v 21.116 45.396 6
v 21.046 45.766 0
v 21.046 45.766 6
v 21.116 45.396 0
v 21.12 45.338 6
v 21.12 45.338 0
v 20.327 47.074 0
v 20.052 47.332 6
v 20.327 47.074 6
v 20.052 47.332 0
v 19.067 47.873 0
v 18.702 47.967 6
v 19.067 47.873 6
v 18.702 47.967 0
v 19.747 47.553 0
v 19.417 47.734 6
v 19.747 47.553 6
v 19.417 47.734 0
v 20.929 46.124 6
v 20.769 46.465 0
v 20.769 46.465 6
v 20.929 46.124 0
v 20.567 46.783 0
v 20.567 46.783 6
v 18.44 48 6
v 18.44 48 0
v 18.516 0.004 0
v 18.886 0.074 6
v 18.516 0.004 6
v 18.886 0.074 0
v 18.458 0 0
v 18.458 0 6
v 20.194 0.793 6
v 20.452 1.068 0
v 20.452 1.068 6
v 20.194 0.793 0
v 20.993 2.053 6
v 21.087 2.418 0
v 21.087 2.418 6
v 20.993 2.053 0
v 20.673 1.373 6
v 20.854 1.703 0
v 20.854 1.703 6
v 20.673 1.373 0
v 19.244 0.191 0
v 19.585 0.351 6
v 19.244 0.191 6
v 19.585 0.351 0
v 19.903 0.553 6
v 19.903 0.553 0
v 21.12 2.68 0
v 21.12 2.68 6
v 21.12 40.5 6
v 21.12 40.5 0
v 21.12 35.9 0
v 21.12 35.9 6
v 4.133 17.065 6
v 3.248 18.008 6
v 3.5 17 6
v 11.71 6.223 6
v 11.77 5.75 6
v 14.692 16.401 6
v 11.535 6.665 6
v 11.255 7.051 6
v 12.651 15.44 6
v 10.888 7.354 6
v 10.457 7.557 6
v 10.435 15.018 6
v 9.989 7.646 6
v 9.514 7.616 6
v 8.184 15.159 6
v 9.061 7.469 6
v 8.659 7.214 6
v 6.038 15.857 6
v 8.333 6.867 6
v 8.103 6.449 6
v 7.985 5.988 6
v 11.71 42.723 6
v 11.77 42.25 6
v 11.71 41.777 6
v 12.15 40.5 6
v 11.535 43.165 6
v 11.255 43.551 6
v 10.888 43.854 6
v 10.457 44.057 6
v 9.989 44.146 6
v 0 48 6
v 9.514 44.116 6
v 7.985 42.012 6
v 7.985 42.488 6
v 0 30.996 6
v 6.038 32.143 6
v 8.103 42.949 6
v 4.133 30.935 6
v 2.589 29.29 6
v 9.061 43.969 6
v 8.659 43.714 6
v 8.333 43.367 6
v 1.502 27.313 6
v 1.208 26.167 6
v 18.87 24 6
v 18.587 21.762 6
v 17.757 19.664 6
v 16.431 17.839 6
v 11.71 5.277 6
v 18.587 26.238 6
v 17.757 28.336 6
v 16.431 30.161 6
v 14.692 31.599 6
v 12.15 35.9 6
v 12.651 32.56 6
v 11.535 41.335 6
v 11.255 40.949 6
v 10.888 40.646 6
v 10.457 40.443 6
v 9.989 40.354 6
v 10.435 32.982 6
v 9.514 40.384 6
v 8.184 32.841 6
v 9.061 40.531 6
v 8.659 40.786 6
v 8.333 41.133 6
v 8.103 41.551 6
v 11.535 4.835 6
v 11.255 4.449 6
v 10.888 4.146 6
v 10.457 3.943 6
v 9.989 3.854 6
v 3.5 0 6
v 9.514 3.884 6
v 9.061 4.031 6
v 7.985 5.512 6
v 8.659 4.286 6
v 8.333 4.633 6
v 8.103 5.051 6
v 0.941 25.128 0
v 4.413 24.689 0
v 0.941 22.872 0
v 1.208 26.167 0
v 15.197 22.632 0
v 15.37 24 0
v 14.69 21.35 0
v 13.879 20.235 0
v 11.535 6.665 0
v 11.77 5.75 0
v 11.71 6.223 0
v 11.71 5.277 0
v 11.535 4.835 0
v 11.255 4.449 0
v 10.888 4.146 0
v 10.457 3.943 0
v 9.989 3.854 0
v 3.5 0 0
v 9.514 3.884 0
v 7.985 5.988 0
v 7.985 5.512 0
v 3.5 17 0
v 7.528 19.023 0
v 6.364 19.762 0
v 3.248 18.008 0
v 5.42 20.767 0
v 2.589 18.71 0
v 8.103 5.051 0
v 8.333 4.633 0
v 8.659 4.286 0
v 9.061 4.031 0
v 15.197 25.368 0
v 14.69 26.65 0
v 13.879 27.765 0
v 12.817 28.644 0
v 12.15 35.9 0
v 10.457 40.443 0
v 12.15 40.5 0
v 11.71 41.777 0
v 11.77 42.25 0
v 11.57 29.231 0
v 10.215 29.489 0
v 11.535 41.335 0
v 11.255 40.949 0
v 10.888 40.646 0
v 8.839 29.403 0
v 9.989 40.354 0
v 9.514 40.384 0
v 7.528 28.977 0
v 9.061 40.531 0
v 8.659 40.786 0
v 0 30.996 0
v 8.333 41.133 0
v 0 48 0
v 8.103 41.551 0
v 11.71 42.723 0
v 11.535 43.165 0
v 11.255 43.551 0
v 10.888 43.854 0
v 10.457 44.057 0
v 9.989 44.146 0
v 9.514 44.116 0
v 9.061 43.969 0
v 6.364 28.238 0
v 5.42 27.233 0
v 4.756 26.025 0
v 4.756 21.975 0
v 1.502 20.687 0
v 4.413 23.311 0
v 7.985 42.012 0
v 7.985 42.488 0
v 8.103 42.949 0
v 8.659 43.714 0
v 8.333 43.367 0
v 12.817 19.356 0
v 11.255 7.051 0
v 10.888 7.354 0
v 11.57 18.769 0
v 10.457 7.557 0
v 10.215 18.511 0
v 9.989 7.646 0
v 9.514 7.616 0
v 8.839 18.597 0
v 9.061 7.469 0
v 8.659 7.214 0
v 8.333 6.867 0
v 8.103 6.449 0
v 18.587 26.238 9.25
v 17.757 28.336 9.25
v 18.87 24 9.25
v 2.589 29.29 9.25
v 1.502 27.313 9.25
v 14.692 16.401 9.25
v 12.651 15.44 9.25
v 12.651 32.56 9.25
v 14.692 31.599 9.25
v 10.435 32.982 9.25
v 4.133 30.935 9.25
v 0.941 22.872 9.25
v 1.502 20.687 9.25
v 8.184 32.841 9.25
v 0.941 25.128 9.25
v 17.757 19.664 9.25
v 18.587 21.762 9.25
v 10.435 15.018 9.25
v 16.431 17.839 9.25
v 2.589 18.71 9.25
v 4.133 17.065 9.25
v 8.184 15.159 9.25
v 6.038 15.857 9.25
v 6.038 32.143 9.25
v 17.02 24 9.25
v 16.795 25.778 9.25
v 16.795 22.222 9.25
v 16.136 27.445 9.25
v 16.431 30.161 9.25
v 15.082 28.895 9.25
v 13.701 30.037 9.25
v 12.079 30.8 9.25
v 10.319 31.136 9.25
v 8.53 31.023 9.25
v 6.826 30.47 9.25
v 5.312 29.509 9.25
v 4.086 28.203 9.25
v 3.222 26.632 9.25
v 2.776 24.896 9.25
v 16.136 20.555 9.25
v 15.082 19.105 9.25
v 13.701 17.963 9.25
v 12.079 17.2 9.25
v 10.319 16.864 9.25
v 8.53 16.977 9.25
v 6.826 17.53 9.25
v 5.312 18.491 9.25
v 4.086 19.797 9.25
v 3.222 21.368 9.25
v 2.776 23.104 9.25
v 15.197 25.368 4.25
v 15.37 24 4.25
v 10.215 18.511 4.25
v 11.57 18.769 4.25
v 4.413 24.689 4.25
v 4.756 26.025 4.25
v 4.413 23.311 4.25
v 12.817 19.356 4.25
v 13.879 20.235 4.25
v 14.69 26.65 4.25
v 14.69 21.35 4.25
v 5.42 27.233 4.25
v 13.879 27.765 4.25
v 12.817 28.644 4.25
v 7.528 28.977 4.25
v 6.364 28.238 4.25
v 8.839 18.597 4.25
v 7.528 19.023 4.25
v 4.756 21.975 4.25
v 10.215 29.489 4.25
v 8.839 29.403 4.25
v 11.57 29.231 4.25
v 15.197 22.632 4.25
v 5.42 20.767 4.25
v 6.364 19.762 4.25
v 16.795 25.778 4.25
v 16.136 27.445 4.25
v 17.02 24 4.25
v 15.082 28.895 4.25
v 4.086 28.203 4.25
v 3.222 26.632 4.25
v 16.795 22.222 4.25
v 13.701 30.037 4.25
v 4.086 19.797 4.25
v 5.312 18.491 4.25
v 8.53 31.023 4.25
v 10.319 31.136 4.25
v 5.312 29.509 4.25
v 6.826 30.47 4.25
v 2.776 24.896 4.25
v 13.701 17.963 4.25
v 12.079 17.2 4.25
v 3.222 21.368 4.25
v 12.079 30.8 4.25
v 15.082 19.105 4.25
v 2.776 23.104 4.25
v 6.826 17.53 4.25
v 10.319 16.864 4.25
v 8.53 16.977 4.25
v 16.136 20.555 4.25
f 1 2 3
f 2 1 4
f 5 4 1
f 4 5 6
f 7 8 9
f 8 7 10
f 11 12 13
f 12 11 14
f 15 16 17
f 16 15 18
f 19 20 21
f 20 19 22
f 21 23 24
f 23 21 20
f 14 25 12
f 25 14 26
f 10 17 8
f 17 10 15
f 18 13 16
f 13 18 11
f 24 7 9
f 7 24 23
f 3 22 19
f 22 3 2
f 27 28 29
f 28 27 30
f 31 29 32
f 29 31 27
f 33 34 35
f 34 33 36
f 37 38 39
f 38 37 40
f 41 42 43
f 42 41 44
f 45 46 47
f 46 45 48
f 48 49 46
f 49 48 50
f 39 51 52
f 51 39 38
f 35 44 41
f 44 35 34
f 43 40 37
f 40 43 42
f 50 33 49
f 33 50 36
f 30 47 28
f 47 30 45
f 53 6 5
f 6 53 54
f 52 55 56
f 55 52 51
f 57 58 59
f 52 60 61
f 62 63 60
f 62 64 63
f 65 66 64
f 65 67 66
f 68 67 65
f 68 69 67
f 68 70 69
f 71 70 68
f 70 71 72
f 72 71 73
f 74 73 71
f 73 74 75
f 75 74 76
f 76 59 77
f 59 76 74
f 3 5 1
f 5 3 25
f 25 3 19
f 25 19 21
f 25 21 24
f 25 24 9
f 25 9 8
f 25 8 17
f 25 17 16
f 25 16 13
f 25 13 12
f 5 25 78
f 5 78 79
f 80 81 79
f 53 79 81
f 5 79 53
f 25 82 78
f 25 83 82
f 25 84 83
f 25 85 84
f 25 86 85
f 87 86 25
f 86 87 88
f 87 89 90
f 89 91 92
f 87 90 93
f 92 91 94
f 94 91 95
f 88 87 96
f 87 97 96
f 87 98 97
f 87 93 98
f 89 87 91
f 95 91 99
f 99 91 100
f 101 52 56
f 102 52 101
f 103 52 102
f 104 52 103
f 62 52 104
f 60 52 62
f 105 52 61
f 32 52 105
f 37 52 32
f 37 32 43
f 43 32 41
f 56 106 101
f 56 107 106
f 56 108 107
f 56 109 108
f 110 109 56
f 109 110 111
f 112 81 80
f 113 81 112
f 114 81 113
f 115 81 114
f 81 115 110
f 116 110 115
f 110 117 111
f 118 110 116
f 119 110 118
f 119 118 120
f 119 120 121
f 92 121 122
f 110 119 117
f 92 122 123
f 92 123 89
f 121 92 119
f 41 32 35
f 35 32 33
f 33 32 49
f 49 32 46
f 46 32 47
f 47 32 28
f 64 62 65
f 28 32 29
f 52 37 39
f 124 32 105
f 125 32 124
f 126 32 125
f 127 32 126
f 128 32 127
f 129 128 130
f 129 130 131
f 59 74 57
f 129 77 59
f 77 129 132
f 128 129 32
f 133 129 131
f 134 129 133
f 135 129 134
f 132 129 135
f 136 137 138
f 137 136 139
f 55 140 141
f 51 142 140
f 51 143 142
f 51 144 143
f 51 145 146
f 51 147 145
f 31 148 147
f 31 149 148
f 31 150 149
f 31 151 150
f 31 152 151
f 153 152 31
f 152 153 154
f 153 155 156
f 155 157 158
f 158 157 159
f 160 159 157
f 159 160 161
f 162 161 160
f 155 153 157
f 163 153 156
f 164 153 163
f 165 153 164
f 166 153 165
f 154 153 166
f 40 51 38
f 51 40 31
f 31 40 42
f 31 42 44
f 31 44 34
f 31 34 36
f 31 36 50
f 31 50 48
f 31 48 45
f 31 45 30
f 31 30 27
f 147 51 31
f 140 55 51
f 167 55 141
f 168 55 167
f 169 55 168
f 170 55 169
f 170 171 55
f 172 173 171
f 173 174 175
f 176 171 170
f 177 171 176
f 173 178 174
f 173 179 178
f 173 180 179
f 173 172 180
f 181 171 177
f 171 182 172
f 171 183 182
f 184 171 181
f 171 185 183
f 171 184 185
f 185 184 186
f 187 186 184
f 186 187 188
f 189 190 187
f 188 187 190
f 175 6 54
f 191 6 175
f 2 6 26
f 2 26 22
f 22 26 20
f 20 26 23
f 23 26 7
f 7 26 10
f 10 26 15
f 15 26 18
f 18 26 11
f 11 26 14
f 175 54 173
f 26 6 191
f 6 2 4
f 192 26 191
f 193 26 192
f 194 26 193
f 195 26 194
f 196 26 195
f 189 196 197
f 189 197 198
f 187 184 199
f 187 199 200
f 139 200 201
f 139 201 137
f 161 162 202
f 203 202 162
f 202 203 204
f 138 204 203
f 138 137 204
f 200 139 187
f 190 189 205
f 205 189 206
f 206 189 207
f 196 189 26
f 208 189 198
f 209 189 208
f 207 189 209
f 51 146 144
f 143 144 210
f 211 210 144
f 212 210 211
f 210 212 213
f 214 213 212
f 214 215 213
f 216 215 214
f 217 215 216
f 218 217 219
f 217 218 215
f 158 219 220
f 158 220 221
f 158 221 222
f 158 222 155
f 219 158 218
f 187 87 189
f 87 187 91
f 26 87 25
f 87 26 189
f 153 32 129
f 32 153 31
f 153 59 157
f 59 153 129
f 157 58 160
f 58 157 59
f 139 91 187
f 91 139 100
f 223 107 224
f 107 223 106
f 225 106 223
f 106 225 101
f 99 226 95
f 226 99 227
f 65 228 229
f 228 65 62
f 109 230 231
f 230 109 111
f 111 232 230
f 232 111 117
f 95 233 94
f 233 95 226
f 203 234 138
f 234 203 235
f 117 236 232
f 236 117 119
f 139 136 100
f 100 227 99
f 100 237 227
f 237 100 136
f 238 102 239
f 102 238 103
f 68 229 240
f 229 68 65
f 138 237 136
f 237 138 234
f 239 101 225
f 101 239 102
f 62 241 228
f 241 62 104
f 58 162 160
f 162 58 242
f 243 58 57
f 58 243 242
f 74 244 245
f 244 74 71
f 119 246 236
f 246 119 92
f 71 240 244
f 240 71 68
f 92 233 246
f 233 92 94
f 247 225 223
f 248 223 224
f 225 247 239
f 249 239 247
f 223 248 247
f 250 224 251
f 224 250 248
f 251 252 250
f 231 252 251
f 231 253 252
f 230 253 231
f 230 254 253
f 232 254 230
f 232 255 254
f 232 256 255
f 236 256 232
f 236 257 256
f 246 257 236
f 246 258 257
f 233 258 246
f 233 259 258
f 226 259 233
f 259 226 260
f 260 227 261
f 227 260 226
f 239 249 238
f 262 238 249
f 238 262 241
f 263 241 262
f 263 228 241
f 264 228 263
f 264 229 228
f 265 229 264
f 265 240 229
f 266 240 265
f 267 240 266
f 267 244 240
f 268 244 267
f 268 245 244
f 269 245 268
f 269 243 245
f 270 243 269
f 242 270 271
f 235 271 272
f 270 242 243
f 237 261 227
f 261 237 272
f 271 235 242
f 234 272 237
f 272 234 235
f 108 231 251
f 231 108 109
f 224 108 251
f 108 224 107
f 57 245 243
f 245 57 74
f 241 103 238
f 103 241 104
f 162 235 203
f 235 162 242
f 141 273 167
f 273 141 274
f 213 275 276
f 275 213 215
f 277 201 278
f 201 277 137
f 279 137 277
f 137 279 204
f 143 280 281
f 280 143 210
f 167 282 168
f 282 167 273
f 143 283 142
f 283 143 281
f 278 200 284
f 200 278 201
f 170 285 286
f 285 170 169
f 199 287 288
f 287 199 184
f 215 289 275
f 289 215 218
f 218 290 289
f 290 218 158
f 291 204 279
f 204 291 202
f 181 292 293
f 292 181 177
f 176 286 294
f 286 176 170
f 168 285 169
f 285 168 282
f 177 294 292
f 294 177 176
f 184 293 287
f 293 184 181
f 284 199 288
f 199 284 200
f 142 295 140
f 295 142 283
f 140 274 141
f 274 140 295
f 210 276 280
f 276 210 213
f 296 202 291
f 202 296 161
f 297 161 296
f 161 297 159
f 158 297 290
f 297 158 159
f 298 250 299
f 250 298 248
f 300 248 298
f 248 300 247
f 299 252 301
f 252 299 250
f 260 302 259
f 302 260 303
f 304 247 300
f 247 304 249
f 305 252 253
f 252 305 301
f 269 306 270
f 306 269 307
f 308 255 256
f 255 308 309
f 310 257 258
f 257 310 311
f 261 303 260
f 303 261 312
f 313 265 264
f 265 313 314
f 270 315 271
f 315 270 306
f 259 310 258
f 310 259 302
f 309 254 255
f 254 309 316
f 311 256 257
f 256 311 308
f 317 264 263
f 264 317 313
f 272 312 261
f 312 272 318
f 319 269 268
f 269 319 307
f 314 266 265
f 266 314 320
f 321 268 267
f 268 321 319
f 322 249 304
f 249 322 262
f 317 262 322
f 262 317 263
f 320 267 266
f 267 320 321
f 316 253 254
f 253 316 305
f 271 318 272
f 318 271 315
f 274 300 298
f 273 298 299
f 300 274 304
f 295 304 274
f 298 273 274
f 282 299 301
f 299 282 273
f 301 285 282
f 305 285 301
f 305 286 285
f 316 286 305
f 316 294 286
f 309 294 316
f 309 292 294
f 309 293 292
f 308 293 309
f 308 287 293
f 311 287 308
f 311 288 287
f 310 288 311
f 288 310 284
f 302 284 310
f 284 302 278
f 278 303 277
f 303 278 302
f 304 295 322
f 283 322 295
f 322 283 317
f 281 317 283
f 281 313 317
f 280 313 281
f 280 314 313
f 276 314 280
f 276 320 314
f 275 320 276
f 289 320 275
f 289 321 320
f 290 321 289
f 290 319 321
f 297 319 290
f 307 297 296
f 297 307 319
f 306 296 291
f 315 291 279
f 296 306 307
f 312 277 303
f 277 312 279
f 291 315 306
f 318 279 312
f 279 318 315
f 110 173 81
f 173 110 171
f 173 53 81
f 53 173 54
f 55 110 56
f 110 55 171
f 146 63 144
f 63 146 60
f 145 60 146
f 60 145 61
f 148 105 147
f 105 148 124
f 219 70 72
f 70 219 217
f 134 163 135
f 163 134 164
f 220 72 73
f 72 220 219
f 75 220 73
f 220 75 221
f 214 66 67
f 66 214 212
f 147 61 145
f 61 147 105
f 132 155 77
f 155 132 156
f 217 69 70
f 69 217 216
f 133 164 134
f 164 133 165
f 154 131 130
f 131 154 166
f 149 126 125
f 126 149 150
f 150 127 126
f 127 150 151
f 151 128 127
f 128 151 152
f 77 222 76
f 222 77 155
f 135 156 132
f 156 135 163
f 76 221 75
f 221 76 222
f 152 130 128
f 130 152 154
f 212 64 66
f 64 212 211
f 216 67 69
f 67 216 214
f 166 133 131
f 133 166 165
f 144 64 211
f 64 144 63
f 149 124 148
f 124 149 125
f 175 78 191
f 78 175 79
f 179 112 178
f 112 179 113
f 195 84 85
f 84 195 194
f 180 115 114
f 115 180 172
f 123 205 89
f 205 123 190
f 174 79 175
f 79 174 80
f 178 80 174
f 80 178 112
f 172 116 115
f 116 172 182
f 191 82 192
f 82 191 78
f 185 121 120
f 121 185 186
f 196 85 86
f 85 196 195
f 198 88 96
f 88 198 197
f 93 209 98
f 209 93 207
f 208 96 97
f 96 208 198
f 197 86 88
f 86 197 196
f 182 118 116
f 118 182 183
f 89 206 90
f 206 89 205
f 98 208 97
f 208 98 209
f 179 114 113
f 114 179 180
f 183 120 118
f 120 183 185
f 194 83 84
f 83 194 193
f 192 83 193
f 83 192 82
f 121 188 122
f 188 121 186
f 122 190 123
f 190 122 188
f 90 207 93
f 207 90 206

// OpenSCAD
// file: library/library_3d.scad
// ========================================================================================
// Robori Mendel
// General 3D library
// GNU GPL v3
//
// Contact : support@robori.com
// Reference : http://www.robori.com/documentation/Mendel
//
// History :
// 2013 - First version
// ========================================================================================

lib3d_fn = 50;

// TESTING
//lib3d_hex_nut_recess(3);
//lib3d_round_cube(10, 8, 10, 1, true, false, true, false);


// Hexagonal nut recess
module lib3d_hex_nut_recess(size)
{
	length = 0.8*size;
	hex_r = 1.8*size/2;
	cylinder(h=length, r=hex_r, center=false, $fn=6);
}

// Cube with customized rounded corners
module lib3d_round_cube(x, y, z, rad, left_top=true, left_bottom=true, right_top=true, right_bottom=true)
{
	rx = x/2 - rad + 0.02;
	ry = y/2 - rad + 0.02;

	translate([x/2, y/2, 0]) difference()
	{	
		translate([-x/2, -y/2, 0]) cube([x, y, z]);
		if (left_top)
			translate([-rx, ry, -1]) rotate([0, 0, 90]) __lib3d_round_corner(rad, z + 2);
		if (left_bottom)
			translate([-rx, -ry, -1]) rotate([0, 0, 180]) __lib3d_round_corner(rad, z + 2);
		if (right_top)
			translate([rx, ry, -1]) __lib3d_round_corner(rad, z + 2);
		if (right_bottom)
			translate([rx, -ry, -1]) rotate([0, 0, 270]) __lib3d_round_corner(rad, z + 2);
	}
}

// Helper
module __lib3d_round_corner(rad, height)
{
	difference()
	{
		cube([rad, rad, height]);
		cylinder(h=height, r=rad, center=false, $fn=lib3d_fn);
	}
}
// main file
// ========================================================================================
// Robori Mendel
// Extruder bearing cover
// GNU GPL v3
//
// Contact : support@robori.com
// Reference : http://www.robori.com/documentation/Mendel
//
// History :
// 2014 - First version
// ========================================================================================

include <library/library_3d.scad>;

$fn = 25;

extruder_bearing_cover();

module extruder_bearing_cover()
{
	difference()
	{
		union()
		{
			difference()
			{
				// block
				lib3d_round_cube(21.12, 42 + 3 + 3, 6, 3, false, false, true, true);
				// idler adjuster cut
				translate([-1, -1, -1]) cube([3.5 + 1, 14 + 3 + 1, 6 + 2]);
				translate([3.5, 14 + 3, -1]) rotate([0, 0, 104.04]) cube([15, 15, 6 + 2]);
			}
			// bearing housing
			translate([9.87, 21 + 3, 0]) cylinder(h=9.25, r=9, center=false);
		}
		// bearing housing
		translate([9.87, 21 + 3, -1]) cylinder(h=9.25 + 2, r=5.5, center=false);
		translate([9.87, 21 + 3, 4.25]) cylinder(h=5 + 1, r=7 + 0.15, center=false);
		// tongue slot
		translate([12.25 - 0.1, 33.2 + 3 - 0.3, -1]) cube([8 + 0.2 + 1, 4 + 0.6, 6 + 2]);
		// screw holes
		translate([9.87, 2.75 + 3, -1]) cylinder(h=6 + 2, r=1.5 + 0.4, center=false);
		translate([9.87, 39.25 + 3, -1]) cylinder(h=6 + 2, r=1.5 + 0.4, center=false);
		// nut recesses : disabled due to tongue slot
		//translate([9.87, 2.75, -0.02]) lib3d_hex_nut_recess(3 + 0.4);
		//translate([9.87, 39.25, -0.02]) lib3d_hex_nut_recess(3 + 0.4);
	}
}
